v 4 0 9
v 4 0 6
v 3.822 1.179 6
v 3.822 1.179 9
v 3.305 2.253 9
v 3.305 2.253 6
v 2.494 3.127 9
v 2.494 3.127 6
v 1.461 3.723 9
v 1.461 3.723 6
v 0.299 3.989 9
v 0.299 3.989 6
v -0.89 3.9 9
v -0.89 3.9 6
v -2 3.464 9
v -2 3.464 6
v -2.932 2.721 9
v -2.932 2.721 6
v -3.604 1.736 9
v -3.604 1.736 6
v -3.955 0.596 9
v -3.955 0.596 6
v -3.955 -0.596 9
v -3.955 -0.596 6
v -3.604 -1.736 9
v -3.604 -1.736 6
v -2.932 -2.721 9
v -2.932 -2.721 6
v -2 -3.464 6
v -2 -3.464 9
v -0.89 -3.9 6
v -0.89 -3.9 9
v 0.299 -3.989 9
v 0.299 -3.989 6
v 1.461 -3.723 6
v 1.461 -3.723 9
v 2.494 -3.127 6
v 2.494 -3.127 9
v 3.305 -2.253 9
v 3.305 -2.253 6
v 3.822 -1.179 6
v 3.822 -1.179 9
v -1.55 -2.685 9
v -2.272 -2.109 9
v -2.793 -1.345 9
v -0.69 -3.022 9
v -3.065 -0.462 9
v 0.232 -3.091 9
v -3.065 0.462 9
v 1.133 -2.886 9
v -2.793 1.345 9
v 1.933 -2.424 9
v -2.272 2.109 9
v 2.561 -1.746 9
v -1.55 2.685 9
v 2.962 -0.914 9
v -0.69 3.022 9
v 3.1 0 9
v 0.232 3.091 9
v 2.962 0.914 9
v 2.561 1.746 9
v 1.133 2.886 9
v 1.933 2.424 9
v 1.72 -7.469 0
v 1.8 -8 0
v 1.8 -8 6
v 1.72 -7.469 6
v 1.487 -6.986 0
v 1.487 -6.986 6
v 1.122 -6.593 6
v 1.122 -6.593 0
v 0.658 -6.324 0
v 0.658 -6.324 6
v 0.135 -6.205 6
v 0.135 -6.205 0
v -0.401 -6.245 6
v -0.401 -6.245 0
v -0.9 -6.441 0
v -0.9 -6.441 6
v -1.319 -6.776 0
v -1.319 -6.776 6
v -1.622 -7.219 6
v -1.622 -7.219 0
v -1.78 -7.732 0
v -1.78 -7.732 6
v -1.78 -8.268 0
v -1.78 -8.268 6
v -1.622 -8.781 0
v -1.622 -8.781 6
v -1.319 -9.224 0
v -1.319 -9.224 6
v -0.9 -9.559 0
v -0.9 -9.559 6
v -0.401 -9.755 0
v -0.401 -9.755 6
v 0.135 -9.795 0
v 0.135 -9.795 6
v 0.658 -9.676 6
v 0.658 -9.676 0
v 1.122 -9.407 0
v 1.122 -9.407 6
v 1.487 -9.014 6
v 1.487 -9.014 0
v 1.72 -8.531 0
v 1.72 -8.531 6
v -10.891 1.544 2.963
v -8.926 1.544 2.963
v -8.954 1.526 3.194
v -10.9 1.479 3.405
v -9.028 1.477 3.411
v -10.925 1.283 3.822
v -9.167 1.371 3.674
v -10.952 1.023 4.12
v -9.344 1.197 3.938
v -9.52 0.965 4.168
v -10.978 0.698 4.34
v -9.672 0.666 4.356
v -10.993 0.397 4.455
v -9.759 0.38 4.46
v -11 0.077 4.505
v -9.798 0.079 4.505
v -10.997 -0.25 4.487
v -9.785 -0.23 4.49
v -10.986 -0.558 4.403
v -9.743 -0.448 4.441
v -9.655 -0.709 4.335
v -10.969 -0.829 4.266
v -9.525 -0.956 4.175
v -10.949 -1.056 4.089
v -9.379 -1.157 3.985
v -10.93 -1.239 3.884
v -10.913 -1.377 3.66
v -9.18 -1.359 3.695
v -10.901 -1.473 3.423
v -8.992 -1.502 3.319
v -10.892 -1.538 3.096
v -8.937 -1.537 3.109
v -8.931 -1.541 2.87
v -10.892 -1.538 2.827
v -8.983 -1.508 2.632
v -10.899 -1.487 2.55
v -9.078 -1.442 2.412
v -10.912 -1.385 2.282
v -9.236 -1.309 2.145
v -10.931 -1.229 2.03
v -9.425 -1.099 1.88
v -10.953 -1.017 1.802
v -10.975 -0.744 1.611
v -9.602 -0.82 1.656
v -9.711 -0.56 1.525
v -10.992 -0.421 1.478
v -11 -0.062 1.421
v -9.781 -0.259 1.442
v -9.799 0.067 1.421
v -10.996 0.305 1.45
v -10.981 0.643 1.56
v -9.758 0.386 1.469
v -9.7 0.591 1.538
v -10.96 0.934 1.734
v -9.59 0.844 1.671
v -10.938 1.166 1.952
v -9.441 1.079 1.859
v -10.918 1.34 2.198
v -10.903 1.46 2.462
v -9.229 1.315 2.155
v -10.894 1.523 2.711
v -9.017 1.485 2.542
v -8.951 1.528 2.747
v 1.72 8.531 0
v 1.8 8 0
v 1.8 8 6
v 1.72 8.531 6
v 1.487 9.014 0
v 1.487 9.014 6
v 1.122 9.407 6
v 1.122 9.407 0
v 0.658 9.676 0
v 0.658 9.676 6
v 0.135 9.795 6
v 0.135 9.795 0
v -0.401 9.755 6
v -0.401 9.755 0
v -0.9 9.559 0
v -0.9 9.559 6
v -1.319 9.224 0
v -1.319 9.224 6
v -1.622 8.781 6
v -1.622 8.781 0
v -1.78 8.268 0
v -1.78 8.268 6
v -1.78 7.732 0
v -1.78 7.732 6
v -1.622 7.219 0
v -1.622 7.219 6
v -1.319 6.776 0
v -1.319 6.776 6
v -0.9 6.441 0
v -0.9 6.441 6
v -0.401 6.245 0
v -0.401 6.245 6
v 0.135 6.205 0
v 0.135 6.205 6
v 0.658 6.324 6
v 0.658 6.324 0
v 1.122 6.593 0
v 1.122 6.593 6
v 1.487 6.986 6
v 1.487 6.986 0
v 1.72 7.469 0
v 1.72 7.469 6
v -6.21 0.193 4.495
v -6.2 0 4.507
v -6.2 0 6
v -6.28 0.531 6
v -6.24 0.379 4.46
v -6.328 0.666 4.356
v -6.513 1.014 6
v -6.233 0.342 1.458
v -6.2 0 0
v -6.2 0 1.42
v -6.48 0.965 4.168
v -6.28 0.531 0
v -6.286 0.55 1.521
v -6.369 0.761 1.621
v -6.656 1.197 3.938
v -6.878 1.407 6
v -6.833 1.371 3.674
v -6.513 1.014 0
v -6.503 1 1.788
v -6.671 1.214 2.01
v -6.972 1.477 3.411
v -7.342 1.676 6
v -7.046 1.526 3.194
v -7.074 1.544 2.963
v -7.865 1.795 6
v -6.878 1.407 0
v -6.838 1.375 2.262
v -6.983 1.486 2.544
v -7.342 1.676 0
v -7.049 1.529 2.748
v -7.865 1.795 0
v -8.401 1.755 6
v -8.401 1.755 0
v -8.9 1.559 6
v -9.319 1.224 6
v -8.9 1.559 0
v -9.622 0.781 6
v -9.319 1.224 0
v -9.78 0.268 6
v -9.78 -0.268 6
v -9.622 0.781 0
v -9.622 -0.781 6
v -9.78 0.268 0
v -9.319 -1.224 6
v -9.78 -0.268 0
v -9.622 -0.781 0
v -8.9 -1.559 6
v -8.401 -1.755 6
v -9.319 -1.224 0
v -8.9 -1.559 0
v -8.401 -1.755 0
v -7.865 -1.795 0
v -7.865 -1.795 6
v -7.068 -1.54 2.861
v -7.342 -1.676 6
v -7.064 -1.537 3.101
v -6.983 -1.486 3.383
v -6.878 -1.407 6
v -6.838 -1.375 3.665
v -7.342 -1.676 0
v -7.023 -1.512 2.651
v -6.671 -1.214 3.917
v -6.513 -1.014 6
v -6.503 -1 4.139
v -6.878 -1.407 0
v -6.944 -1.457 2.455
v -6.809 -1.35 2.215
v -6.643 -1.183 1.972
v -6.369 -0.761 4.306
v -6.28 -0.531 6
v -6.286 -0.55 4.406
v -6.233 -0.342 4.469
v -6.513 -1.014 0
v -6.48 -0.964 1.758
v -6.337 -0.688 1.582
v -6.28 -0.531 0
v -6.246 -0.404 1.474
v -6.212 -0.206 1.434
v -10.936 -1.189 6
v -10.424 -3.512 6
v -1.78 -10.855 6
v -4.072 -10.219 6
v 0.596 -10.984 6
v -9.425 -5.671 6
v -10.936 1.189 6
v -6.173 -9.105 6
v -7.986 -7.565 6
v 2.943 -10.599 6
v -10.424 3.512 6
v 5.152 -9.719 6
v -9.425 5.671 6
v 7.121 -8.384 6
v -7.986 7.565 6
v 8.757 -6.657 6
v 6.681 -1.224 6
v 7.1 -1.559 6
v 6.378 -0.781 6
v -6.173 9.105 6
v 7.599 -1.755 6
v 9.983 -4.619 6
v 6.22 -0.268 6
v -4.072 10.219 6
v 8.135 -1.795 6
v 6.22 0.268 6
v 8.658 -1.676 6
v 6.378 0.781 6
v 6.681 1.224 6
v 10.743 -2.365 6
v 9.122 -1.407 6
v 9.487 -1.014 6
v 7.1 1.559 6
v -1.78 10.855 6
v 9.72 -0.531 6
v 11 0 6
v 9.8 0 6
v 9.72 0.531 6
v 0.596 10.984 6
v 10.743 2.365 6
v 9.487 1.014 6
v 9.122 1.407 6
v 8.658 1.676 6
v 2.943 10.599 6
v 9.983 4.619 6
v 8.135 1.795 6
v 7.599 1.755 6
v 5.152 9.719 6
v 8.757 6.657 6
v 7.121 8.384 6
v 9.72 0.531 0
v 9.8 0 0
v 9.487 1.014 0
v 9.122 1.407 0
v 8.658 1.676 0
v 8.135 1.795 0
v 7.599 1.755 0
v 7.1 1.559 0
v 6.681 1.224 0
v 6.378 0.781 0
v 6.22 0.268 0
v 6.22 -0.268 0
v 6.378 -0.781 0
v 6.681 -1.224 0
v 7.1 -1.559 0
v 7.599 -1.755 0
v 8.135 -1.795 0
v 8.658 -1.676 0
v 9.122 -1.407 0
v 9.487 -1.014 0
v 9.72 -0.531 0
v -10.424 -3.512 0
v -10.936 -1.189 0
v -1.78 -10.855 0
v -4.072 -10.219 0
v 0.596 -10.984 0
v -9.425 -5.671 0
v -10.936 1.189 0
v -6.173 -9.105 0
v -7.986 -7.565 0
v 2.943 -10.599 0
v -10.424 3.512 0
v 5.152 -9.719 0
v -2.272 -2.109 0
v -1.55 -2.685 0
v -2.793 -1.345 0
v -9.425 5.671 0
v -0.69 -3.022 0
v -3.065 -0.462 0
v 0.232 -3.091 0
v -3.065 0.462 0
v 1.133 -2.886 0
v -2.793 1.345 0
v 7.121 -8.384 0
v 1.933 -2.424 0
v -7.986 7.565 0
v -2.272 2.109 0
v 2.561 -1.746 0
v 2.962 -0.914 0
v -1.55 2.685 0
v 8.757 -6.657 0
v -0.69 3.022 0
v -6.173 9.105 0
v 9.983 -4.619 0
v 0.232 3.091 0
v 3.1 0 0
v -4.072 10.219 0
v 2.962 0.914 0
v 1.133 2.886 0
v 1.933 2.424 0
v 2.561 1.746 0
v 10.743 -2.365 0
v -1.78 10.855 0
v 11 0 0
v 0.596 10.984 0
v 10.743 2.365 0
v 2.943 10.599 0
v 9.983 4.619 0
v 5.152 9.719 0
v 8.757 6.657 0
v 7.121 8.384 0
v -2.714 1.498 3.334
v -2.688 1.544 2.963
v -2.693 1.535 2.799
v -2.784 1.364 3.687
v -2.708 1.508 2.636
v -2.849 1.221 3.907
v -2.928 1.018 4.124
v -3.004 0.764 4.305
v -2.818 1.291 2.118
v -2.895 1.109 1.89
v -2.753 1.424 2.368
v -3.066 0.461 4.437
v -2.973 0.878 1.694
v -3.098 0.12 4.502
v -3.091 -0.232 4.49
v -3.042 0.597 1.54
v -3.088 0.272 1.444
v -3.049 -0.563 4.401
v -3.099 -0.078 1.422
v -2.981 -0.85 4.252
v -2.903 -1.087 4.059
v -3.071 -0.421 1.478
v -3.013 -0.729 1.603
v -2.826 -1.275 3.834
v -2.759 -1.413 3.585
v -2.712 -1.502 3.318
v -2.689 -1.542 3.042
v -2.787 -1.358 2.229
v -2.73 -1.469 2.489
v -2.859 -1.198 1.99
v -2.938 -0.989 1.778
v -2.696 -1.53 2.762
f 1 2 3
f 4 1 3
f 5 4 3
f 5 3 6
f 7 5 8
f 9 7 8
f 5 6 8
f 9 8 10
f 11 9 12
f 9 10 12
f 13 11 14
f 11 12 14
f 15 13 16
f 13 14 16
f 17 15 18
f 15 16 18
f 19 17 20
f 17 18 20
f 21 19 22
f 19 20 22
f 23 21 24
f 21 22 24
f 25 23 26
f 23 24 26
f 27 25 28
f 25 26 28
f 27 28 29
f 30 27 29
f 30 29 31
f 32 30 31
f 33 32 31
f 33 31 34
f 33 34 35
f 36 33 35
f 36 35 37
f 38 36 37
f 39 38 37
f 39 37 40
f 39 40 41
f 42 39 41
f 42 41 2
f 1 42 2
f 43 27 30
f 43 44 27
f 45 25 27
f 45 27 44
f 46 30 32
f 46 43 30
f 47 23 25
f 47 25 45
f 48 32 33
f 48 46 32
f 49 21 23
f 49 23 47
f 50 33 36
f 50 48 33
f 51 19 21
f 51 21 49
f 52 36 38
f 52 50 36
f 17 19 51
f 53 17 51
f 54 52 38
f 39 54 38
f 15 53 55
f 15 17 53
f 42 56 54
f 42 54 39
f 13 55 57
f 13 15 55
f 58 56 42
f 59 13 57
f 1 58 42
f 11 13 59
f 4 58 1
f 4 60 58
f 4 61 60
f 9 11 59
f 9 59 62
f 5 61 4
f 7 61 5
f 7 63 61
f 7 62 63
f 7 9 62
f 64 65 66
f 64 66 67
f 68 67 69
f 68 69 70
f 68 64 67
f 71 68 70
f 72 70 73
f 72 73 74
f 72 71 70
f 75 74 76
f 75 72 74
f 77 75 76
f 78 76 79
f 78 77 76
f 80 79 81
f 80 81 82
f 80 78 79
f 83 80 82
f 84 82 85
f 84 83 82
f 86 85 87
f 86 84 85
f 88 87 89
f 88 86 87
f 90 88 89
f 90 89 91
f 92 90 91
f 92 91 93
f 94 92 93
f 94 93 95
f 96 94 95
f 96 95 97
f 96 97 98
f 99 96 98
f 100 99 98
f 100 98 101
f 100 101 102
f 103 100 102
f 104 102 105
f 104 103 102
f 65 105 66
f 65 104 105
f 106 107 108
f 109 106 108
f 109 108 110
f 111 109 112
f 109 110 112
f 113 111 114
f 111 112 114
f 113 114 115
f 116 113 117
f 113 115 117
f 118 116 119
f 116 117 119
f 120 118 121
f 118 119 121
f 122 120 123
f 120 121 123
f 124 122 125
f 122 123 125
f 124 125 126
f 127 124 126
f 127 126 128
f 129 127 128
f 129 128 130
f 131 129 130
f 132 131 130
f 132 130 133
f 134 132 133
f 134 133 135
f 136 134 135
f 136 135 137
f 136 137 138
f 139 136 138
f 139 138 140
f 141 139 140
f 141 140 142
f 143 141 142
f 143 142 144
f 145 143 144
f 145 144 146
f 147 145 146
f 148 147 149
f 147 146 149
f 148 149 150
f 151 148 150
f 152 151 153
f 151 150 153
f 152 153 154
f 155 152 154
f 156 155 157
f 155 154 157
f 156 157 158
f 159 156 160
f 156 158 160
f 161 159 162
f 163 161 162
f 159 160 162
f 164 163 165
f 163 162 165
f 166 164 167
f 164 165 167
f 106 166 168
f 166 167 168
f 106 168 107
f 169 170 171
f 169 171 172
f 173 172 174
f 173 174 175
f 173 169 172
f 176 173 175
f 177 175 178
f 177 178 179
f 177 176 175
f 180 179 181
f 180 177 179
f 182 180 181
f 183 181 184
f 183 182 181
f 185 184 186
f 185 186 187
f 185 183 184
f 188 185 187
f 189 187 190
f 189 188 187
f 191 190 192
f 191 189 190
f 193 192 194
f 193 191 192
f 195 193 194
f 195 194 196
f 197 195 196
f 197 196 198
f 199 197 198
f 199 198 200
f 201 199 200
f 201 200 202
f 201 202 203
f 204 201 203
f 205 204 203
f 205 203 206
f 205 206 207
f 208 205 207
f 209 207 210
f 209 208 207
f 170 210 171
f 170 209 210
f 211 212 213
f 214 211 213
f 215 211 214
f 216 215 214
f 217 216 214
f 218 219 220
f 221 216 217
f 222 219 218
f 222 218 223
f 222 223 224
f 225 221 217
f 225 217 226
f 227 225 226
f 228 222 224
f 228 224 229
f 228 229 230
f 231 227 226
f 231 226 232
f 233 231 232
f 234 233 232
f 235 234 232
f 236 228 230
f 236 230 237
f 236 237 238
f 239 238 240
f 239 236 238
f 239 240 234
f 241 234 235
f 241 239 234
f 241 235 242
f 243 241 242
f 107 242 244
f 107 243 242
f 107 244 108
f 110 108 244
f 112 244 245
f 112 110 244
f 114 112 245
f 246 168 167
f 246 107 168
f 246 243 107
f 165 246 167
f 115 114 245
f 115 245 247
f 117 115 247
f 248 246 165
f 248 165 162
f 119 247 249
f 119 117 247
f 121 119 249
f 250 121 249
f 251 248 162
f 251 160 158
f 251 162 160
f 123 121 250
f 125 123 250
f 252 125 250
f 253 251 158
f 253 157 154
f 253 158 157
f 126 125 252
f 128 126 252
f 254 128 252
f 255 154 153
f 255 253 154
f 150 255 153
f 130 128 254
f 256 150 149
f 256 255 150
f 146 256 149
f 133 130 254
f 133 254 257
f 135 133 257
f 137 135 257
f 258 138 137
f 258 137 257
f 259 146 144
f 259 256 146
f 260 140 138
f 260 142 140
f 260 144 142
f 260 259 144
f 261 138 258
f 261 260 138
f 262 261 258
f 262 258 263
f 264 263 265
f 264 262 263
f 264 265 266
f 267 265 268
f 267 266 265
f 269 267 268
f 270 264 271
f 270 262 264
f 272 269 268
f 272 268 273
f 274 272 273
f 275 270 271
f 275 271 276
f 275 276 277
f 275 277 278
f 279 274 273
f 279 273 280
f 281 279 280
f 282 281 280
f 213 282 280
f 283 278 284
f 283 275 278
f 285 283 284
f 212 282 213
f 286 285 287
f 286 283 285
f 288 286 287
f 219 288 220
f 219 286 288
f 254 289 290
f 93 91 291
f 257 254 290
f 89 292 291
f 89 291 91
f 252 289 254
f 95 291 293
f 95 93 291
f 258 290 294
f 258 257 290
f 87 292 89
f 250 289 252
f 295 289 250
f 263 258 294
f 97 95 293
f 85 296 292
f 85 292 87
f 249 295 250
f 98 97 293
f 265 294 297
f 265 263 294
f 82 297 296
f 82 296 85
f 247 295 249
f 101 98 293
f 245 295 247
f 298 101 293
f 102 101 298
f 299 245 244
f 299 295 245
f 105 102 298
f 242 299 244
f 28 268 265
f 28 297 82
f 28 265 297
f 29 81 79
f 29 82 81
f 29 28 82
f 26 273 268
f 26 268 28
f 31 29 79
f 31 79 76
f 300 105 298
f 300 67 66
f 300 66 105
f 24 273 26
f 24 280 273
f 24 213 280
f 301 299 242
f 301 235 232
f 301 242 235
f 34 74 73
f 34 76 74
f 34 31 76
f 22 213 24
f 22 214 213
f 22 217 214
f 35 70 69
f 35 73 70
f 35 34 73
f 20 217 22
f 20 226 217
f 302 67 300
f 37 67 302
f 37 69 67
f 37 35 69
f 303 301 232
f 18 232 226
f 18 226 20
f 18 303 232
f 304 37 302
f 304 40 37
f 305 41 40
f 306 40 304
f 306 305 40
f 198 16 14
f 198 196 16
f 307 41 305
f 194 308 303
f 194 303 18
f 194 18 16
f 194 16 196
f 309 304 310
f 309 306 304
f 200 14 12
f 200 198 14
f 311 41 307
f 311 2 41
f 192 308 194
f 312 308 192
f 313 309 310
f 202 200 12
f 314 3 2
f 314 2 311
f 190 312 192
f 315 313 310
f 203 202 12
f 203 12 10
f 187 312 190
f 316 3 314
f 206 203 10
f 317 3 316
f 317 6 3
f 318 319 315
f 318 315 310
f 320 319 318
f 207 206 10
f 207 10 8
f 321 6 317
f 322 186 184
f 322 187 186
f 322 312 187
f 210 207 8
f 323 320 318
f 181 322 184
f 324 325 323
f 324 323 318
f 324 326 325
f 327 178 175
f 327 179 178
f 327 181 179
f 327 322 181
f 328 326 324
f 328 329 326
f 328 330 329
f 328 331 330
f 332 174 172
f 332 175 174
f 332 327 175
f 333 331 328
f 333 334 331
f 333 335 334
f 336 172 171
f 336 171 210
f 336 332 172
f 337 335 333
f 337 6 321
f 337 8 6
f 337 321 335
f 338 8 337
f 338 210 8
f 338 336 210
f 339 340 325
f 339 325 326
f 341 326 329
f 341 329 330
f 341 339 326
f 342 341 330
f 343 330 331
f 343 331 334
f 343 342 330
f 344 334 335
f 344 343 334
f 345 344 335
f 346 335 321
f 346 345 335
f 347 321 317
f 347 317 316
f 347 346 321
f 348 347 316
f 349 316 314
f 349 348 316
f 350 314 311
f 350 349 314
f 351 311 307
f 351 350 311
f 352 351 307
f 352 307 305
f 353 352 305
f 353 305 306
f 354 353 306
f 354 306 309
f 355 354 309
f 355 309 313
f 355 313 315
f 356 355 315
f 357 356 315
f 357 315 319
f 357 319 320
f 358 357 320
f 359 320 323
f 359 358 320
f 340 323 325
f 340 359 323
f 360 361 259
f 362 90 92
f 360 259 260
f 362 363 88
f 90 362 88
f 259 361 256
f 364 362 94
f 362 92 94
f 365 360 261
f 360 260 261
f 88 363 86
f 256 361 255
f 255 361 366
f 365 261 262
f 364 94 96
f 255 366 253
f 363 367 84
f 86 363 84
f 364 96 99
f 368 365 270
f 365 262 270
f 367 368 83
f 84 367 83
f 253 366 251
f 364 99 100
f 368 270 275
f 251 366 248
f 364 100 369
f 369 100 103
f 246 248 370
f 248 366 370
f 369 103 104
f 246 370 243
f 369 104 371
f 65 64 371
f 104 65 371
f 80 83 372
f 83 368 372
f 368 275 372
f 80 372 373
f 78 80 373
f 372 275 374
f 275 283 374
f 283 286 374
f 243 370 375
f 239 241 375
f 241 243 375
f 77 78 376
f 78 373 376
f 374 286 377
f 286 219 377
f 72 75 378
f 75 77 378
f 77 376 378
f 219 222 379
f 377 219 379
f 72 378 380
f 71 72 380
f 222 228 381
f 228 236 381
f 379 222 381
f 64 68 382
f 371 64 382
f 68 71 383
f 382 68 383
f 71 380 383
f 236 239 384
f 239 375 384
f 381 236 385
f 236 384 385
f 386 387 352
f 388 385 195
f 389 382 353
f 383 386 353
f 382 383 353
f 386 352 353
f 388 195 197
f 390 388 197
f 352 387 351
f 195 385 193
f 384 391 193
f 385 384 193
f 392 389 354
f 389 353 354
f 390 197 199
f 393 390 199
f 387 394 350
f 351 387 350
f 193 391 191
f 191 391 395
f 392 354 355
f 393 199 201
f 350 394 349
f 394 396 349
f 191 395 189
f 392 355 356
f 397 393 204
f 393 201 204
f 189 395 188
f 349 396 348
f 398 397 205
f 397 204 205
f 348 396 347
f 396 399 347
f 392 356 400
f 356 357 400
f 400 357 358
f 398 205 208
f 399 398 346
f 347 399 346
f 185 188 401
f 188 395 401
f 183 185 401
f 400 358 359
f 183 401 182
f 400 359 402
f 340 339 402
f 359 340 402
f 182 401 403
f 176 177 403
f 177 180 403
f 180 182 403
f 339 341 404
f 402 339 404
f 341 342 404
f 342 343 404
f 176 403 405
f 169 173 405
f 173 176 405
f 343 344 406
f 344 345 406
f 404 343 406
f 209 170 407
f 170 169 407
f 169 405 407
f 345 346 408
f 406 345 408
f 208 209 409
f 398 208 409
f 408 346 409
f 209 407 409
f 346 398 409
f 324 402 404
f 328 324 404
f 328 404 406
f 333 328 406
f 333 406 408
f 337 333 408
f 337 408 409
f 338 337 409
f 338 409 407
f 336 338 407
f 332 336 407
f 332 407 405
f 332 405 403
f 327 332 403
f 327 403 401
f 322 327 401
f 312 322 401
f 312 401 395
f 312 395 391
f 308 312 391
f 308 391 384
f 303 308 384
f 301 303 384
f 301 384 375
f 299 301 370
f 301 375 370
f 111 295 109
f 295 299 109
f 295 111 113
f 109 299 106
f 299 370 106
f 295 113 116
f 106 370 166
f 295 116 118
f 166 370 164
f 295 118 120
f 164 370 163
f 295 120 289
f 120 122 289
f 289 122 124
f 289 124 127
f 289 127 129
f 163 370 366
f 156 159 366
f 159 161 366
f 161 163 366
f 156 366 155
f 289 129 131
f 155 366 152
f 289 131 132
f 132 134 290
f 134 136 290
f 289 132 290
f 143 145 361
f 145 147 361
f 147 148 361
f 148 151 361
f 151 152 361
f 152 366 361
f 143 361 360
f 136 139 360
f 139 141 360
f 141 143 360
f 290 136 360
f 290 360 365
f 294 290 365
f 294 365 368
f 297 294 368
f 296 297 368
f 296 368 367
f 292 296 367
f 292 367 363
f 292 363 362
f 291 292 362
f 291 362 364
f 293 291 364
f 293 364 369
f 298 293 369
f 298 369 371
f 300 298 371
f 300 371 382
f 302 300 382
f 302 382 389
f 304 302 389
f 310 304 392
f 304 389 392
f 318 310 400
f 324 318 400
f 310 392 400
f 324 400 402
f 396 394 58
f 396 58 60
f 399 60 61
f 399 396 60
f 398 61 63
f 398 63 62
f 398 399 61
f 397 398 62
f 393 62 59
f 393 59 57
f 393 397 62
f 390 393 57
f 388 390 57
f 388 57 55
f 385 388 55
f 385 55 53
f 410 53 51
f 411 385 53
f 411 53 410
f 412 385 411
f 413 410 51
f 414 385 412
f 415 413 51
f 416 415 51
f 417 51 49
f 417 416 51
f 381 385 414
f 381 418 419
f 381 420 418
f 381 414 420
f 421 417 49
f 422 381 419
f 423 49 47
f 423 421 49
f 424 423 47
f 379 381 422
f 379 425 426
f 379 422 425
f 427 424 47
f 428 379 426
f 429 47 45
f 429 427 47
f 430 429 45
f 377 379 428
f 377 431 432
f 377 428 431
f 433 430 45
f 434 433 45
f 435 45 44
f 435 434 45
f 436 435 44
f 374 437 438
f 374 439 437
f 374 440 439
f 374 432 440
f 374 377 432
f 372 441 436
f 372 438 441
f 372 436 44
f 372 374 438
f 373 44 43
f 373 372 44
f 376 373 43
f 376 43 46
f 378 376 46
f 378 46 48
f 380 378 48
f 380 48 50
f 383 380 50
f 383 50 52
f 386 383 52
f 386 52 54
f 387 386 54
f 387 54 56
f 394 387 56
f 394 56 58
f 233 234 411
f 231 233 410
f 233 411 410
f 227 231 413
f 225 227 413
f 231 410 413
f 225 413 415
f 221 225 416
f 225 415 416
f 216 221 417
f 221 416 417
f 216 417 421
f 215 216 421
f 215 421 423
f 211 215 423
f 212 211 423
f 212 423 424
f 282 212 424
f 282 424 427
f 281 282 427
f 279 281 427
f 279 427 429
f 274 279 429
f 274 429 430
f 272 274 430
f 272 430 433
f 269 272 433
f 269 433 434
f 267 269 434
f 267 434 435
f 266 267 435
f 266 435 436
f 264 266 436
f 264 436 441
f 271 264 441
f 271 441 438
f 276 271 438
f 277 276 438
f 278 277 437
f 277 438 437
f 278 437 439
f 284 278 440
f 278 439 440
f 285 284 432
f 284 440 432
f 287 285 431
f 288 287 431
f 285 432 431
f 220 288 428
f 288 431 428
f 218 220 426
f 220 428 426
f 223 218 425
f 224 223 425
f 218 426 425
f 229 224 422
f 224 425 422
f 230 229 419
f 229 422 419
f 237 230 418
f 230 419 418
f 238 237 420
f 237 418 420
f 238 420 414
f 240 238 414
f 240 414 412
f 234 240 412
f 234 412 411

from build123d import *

# Parameters (mm, degrees)
F0_R     = 11
F0_R_2   = 1.8
F0_R_3   = 4
F1_DEPTH = 6
F0_R_4   = 3.1
F2_DEPTH = 9
F3_R     = 1.543605
F4_DEPTH = 11.001


with BuildPart() as f1:
    # F0 (on Top) → F1 (new body)
    with BuildSketch(Plane.XY):
        Circle(F0_R)
        with Locations((0, -8)):
            Circle(F0_R_2, mode=Mode.SUBTRACT)
        with Locations((-8, 0)):
            Circle(F0_R_2, mode=Mode.SUBTRACT)
        Circle(F0_R_3, mode=Mode.SUBTRACT)
        with Locations((8, 0)):
            Circle(F0_R_2, mode=Mode.SUBTRACT)
        with Locations((0, 8)):
            Circle(F0_R_2, mode=Mode.SUBTRACT)
    extrude(amount=F1_DEPTH)

    # F0 (on Top) → F2 (join)
    with BuildSketch(Plane.XY):
        Circle(F0_R_3)
        Circle(F0_R_4, mode=Mode.SUBTRACT)
    extrude(amount=F2_DEPTH)

    # F3 (on Right) → F4 (cut, through all)
    with BuildSketch(Plane.YZ):
        with Locations((0, 2.963449)):
            Circle(F3_R)
    extrude(amount=-F4_DEPTH, mode=Mode.SUBTRACT)


solid = f1.part
